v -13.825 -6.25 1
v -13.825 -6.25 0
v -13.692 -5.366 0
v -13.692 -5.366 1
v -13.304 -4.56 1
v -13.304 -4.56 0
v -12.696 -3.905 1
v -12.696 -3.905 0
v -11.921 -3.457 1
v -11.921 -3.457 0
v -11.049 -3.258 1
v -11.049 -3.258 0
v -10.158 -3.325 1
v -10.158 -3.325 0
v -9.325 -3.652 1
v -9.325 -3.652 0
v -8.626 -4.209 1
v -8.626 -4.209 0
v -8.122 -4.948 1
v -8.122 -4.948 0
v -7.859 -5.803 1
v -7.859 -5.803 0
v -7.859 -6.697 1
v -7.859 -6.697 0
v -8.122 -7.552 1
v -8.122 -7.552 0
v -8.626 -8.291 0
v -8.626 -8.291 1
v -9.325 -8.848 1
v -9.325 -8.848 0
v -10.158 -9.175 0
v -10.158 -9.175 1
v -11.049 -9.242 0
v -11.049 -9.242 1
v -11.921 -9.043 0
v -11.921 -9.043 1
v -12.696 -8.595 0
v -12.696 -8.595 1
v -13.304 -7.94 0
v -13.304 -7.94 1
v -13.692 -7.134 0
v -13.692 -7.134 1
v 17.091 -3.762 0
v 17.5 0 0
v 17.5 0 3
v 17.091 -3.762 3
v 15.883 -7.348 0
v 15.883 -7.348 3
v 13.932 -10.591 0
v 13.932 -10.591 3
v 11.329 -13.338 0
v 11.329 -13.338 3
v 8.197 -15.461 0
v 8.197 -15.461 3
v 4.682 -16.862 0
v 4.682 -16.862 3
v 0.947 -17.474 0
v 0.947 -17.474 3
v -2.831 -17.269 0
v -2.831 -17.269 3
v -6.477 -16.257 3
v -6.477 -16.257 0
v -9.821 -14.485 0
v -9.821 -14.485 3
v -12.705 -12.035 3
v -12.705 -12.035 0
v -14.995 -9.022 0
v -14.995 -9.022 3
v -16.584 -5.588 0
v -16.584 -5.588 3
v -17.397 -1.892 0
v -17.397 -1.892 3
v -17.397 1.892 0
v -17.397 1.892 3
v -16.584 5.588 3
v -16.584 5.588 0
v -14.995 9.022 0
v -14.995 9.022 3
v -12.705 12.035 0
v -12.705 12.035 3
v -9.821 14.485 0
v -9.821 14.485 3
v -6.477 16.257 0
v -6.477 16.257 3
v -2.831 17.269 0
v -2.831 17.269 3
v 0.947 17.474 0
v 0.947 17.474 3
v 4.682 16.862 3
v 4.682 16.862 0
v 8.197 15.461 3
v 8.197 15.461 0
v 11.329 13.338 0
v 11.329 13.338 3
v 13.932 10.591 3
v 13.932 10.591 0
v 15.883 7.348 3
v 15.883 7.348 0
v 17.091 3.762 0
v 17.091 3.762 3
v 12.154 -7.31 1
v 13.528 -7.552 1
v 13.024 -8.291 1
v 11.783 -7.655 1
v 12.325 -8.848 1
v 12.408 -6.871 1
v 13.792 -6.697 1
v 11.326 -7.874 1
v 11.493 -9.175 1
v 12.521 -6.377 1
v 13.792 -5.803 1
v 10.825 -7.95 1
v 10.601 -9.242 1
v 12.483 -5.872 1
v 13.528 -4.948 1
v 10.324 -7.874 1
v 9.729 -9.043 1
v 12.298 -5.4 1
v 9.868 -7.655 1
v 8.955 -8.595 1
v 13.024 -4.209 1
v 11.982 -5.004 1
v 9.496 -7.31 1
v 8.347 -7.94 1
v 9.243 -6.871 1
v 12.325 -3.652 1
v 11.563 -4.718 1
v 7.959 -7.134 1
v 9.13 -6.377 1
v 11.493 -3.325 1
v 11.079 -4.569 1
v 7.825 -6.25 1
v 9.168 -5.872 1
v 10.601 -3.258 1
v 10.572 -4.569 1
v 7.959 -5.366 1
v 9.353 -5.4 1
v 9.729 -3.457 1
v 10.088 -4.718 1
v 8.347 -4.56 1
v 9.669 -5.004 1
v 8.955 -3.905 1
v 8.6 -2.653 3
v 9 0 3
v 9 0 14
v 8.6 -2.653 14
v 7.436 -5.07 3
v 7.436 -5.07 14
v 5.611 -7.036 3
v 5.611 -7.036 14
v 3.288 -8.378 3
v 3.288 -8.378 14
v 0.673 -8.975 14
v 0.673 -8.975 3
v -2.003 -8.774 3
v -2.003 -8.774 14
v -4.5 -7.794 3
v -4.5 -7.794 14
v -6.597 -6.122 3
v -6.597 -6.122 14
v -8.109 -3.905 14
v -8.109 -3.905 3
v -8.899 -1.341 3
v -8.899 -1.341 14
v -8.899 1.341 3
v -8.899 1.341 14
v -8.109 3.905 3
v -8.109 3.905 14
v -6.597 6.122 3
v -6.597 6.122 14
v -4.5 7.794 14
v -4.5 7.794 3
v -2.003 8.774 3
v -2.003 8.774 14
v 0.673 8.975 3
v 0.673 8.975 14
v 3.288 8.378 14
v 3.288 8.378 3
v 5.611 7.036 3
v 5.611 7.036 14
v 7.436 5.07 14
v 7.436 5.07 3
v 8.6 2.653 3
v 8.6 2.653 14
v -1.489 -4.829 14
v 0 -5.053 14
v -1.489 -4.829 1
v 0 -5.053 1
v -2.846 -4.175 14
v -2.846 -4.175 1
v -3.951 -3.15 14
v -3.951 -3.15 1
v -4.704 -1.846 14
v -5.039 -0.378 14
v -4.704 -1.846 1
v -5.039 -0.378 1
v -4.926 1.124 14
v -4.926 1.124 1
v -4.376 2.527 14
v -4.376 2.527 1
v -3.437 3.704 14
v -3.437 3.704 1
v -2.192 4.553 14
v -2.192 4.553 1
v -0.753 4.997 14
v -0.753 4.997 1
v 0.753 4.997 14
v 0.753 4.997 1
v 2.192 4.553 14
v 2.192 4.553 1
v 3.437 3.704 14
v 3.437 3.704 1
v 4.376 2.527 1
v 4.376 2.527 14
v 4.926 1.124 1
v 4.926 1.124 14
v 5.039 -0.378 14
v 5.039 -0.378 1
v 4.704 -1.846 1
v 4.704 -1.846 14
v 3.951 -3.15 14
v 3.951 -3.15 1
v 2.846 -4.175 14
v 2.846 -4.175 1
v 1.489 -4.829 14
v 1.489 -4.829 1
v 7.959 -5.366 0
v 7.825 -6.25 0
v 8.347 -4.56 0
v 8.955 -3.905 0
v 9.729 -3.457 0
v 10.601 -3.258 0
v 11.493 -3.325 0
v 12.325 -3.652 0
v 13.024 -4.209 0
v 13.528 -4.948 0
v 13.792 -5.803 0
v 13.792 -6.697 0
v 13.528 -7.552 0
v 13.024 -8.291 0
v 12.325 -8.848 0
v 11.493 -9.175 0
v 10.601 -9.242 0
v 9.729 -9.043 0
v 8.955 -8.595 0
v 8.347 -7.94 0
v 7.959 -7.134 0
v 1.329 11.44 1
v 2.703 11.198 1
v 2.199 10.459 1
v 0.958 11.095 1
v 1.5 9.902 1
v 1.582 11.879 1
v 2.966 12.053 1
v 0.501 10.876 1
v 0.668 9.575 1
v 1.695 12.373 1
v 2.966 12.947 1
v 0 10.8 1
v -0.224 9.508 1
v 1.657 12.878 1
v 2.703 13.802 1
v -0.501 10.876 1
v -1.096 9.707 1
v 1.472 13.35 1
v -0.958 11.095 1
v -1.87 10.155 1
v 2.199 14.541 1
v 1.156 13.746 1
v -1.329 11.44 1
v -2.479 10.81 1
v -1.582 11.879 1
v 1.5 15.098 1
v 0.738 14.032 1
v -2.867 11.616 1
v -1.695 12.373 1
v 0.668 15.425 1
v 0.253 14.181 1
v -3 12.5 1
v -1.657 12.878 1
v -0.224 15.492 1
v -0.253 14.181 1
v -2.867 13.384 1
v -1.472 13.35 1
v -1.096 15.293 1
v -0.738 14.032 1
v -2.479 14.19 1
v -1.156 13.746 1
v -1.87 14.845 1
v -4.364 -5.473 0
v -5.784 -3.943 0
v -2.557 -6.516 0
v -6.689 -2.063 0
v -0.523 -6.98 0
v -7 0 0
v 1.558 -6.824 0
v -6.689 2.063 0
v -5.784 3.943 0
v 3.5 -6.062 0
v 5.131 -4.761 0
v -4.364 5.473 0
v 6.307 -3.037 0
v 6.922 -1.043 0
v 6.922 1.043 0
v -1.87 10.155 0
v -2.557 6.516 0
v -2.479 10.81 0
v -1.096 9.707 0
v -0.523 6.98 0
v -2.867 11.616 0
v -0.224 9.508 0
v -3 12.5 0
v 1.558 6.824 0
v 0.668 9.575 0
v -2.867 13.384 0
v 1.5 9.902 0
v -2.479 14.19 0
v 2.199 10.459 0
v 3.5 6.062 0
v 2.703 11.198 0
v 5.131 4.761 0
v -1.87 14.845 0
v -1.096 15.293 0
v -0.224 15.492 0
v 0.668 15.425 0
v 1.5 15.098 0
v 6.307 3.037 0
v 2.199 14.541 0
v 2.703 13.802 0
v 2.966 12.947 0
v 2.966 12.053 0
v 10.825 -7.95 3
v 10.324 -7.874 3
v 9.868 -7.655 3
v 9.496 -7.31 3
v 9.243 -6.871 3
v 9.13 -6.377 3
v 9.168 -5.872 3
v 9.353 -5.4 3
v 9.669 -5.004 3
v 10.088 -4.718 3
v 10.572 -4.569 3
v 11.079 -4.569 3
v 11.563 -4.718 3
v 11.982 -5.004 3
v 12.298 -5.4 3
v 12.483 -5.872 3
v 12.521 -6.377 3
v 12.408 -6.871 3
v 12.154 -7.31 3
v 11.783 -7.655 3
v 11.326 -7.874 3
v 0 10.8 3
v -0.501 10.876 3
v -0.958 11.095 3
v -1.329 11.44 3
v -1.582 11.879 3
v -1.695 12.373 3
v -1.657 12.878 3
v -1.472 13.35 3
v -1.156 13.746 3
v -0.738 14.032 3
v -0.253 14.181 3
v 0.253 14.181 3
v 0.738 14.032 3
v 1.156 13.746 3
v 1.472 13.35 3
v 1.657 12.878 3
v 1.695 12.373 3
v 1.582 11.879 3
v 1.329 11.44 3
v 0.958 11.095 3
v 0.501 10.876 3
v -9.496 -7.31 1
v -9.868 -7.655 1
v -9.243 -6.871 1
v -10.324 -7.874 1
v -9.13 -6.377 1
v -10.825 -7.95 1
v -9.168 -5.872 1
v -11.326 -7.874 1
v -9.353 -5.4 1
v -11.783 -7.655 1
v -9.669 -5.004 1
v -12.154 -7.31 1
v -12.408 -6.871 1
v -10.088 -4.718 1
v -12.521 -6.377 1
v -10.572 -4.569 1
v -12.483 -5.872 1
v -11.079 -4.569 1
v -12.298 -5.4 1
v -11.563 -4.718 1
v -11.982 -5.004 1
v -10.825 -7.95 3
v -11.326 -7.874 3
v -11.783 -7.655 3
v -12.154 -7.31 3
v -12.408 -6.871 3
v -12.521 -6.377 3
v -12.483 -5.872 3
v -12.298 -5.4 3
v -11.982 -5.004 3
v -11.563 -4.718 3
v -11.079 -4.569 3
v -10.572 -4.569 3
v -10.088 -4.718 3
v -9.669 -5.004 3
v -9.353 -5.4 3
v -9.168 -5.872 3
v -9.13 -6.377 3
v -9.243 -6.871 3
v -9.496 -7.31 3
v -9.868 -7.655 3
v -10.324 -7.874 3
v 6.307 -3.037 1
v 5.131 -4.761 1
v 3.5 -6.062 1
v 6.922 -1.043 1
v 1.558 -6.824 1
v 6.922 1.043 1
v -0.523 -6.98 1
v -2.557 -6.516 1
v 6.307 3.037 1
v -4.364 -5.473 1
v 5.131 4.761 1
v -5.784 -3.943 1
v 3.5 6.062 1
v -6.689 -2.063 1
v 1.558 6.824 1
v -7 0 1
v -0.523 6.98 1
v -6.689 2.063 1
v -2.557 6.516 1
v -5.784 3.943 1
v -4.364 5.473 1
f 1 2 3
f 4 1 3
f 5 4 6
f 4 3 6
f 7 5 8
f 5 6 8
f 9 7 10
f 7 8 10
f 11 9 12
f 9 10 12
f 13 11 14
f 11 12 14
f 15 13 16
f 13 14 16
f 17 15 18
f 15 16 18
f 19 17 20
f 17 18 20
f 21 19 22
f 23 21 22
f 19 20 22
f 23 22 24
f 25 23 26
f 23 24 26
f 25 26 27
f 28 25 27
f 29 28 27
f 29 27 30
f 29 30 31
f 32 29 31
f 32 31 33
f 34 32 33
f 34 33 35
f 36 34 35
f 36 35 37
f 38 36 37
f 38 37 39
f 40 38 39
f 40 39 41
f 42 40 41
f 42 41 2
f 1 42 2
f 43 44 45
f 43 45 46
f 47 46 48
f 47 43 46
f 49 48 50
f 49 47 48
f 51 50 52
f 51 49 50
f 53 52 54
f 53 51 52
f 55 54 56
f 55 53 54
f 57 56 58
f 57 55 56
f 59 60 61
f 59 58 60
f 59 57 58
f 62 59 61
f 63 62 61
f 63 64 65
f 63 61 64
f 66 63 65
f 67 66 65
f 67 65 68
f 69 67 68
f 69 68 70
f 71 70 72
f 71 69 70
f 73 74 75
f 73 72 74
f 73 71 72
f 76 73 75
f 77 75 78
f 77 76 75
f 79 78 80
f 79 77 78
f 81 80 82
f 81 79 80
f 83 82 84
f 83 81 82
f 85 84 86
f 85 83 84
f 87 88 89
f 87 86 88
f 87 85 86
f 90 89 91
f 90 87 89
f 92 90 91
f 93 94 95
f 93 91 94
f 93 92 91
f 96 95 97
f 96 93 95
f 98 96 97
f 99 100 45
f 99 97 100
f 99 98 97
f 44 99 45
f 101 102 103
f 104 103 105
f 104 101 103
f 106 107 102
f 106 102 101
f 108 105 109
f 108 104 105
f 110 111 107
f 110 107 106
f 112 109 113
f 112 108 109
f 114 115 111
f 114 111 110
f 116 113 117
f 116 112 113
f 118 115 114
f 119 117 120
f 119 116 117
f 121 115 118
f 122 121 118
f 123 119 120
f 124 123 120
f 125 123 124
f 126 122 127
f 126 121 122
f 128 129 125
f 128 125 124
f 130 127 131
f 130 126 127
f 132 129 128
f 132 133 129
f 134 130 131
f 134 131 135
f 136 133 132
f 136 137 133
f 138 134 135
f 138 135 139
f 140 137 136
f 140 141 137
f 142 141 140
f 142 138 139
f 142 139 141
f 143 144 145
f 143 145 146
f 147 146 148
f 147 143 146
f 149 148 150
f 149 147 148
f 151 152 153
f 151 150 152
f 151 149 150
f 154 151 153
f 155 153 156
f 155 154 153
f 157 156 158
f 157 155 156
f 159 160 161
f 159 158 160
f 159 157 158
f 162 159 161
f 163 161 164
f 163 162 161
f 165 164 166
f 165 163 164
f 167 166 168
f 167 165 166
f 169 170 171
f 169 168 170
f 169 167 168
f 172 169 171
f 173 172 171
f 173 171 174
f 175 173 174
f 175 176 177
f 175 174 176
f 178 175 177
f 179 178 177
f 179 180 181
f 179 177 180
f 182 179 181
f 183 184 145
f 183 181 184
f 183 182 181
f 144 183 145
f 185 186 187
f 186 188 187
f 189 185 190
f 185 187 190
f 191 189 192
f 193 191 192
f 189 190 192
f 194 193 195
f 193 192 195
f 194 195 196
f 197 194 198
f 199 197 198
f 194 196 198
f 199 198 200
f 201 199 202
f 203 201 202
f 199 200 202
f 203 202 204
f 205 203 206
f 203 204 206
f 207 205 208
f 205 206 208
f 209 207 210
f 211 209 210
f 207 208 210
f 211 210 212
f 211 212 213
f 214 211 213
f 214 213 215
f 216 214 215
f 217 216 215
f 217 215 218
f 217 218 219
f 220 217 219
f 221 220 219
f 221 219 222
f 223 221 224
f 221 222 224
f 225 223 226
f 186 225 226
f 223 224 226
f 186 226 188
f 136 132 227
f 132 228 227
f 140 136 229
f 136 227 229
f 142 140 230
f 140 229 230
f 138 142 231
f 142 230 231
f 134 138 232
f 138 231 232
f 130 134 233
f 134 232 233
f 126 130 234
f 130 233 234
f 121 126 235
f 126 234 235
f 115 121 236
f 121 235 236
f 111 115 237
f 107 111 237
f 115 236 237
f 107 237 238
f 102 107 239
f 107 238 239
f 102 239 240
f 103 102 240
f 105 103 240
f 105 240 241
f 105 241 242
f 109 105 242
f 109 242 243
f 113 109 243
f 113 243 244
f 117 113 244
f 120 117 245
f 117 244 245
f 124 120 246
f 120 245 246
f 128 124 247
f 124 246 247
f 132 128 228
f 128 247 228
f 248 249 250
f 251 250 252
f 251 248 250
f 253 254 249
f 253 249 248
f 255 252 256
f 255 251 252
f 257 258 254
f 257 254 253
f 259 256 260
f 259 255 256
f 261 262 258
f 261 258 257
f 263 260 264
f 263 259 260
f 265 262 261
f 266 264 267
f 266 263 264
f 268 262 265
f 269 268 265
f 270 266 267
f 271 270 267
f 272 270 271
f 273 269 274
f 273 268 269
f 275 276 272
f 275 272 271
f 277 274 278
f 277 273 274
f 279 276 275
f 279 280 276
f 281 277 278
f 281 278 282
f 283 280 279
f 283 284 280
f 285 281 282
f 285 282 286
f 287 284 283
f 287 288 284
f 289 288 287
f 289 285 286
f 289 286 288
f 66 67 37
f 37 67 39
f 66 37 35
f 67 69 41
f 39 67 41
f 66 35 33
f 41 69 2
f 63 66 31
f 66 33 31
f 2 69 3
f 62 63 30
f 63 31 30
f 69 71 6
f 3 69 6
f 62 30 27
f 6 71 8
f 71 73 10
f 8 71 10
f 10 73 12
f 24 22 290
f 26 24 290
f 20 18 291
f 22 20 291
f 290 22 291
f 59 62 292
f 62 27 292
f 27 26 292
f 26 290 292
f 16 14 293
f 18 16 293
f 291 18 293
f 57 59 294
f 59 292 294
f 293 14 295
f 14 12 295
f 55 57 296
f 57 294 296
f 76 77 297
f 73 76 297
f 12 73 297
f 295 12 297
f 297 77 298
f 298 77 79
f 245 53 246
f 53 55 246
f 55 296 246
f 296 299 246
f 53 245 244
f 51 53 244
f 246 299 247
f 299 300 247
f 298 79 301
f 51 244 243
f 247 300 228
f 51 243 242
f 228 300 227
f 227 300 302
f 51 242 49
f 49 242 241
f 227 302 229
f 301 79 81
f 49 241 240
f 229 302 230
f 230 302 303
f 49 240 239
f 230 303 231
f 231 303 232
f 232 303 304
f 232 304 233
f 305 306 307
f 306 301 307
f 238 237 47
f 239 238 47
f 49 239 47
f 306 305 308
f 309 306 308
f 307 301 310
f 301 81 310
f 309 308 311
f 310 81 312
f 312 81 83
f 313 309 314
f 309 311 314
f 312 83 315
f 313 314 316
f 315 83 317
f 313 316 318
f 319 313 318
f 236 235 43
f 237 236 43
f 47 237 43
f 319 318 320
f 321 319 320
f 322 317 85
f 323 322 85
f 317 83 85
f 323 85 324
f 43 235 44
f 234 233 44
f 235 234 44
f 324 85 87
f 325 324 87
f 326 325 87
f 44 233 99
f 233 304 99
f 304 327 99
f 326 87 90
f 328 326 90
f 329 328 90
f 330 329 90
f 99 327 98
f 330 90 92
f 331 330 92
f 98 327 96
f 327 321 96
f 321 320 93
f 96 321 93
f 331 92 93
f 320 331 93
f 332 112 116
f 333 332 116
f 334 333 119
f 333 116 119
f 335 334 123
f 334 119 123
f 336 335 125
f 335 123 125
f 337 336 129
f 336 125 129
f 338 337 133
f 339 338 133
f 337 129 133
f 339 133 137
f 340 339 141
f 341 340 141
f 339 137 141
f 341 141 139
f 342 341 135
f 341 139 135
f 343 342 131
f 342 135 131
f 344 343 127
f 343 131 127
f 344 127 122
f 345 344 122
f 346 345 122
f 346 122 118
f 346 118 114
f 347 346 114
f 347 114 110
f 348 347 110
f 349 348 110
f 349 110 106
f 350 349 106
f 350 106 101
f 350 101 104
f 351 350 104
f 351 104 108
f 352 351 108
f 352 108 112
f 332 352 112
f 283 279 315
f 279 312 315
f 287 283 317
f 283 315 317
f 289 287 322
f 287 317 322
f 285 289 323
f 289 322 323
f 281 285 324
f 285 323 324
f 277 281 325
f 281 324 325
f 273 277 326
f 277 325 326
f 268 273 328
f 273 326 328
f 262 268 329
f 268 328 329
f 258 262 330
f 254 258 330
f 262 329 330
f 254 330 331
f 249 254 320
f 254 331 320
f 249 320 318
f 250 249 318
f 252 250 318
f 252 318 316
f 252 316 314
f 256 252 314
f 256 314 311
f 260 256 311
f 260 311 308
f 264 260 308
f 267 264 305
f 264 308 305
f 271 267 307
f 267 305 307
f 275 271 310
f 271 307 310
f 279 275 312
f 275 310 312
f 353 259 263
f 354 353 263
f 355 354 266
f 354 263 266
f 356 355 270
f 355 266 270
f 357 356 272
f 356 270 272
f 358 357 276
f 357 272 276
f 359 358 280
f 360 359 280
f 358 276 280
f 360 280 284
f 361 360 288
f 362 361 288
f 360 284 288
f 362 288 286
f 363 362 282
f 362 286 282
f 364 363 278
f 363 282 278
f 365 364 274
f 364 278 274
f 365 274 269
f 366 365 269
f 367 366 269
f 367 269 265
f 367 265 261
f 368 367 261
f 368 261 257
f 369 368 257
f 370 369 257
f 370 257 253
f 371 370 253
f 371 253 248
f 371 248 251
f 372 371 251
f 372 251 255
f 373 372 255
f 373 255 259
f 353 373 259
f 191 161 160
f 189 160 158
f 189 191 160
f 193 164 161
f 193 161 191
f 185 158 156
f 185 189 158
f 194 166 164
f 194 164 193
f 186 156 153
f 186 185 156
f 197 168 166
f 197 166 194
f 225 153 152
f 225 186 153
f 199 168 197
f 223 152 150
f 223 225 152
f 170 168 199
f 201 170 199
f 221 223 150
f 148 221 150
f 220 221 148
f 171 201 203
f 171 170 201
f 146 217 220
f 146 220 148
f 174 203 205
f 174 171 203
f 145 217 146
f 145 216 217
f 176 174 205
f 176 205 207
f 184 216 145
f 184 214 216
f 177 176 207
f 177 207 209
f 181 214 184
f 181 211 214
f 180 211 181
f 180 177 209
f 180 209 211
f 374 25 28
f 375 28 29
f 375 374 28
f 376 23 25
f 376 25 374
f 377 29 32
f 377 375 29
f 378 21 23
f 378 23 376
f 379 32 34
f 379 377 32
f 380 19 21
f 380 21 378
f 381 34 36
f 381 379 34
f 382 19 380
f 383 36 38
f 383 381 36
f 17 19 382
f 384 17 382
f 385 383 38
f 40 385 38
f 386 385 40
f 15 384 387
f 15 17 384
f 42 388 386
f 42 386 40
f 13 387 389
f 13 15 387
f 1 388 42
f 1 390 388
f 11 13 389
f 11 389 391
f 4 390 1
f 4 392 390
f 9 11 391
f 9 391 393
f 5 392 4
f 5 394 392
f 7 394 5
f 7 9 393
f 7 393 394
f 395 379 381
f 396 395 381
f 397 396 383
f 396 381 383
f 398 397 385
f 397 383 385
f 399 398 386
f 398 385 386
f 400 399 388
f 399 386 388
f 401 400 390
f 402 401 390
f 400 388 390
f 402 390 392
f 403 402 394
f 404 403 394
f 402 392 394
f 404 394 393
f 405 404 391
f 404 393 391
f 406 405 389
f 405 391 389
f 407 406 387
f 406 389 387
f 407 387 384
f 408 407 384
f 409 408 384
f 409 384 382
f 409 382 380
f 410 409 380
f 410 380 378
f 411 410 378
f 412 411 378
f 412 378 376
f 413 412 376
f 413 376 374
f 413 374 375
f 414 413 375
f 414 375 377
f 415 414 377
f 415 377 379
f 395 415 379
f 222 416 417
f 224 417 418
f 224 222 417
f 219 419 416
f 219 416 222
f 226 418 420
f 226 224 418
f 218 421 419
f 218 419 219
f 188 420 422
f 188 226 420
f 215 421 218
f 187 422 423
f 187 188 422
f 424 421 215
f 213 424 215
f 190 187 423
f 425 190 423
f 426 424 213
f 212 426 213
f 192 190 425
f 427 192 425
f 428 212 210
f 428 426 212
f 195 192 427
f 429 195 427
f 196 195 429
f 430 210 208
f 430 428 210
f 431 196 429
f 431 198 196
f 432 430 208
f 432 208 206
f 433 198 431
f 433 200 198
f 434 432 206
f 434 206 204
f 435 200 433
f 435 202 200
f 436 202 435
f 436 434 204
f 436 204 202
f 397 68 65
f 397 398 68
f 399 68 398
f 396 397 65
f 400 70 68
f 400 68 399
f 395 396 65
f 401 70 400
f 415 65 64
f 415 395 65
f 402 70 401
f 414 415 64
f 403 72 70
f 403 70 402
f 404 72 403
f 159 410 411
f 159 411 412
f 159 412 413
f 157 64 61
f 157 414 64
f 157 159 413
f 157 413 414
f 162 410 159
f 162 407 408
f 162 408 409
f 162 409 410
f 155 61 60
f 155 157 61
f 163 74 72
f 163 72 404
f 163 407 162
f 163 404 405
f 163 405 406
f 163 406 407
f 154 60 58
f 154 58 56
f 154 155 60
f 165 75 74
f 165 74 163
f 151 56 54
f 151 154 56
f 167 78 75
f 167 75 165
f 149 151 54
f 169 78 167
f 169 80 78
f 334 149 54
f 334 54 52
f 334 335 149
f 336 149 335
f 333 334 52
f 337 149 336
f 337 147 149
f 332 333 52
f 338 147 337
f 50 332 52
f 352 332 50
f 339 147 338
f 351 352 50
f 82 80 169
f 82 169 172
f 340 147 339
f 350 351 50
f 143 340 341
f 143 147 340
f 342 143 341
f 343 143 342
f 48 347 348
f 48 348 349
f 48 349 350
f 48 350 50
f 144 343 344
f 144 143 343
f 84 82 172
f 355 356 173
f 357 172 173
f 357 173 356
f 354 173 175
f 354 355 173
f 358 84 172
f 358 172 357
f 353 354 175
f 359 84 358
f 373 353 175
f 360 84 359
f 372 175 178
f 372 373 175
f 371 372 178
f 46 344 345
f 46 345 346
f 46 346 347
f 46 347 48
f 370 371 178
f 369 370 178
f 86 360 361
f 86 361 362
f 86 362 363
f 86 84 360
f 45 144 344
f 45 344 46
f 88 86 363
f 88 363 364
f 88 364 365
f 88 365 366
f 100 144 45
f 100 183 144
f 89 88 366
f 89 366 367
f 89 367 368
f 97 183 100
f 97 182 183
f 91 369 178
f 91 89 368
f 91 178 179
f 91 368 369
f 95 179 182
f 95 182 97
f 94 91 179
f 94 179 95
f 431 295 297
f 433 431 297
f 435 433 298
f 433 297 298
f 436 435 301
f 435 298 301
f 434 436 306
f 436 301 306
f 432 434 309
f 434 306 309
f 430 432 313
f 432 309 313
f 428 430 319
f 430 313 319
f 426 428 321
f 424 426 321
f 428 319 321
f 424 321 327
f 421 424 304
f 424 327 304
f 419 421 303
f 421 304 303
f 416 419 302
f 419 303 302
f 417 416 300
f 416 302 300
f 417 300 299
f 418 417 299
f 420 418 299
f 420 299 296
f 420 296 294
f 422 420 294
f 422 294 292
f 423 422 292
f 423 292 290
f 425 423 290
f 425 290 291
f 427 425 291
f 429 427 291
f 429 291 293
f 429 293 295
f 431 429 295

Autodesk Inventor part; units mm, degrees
ref_plane "YZ Plane" through (0, 0, 0) normal (1, 0, 0) x (0, 1, 0)
ref_plane "XZ Plane" through (0, 0, 0) normal (0, 1, 0) x (-1, 0, 0)
ref_plane "XY Plane" through (0, 0, 0) normal (0, 0, 1) x (1, 0, 0)
sketch "スケッチ1" plane through (0, 0, 0) normal (0, 0, 1) x (1, 0, 0)
  circle A0 centre (0, 0) radius 17.5
  dimension "d0" = 35
extrude "押し出し1" add sketch "スケッチ1" along normal blind 3
sketch "スケッチ2" plane through (0, 0, 3) normal (0, 0, 1) x (1, 0, 0)
  circle A0 centre (0, 0) radius 9
  dimension "d3" = 18
extrude "押し出し2" add sketch "スケッチ2" along normal blind 11
sketch "スケッチ3" plane through (0, 0, 14) normal (0, 0, 1) x (1, 0, 0)
  point P0 (0, 0)
  point P1 (0, 0)
hole "穴1" at (0, 0, 14) direction (0, 0, -1) diameter 10.106 end through all thread size "M12x1.75" class "6H" standard "ISO Metric profile"
sketch "スケッチ5" plane through (0, 0, 0) normal (0, 0, -1) x (-1, 0, 0)
  circle A0 centre (0, 0) radius 7
  dimension "d25" = 14
extrude "押し出し3" cut sketch "スケッチ5" against normal blind 1
sketch "スケッチ8" plane through (0, 0, 3) normal (0, 0, 1) x (1, 0, 0)
  point P0 (0, 0)
  point P1 (0, 12.5)
  point P2 (-10.8253, -6.25)
  point P3 (10.8253, -6.25)
  dimension "d47" = 12.5
  dimension "d50" = 360
hole "穴4" at (0, 12.5, 3) at (-10.8253, -6.25, 3) at (10.8253, -6.25, 3) direction (0, 0, -1) diameter 3.4 end through all
sketch "スケッチ9" plane through (0, 0, 0) normal (0, 0, -1) x (-1, 0, 0)
  circle A0 centre (0, 12.5) radius 3
  circle A1 centre (-10.8253, -6.25) radius 3
  circle A2 centre (10.8253, -6.25) radius 3
  point P0 (0, 0)
  dimension "d59" = 6
  dimension "d60" = 12.5
  dimension "d63" = 360
extrude "押し出し5" cut sketch "スケッチ9" against normal blind 1
properties part number "製図規定課題2"
